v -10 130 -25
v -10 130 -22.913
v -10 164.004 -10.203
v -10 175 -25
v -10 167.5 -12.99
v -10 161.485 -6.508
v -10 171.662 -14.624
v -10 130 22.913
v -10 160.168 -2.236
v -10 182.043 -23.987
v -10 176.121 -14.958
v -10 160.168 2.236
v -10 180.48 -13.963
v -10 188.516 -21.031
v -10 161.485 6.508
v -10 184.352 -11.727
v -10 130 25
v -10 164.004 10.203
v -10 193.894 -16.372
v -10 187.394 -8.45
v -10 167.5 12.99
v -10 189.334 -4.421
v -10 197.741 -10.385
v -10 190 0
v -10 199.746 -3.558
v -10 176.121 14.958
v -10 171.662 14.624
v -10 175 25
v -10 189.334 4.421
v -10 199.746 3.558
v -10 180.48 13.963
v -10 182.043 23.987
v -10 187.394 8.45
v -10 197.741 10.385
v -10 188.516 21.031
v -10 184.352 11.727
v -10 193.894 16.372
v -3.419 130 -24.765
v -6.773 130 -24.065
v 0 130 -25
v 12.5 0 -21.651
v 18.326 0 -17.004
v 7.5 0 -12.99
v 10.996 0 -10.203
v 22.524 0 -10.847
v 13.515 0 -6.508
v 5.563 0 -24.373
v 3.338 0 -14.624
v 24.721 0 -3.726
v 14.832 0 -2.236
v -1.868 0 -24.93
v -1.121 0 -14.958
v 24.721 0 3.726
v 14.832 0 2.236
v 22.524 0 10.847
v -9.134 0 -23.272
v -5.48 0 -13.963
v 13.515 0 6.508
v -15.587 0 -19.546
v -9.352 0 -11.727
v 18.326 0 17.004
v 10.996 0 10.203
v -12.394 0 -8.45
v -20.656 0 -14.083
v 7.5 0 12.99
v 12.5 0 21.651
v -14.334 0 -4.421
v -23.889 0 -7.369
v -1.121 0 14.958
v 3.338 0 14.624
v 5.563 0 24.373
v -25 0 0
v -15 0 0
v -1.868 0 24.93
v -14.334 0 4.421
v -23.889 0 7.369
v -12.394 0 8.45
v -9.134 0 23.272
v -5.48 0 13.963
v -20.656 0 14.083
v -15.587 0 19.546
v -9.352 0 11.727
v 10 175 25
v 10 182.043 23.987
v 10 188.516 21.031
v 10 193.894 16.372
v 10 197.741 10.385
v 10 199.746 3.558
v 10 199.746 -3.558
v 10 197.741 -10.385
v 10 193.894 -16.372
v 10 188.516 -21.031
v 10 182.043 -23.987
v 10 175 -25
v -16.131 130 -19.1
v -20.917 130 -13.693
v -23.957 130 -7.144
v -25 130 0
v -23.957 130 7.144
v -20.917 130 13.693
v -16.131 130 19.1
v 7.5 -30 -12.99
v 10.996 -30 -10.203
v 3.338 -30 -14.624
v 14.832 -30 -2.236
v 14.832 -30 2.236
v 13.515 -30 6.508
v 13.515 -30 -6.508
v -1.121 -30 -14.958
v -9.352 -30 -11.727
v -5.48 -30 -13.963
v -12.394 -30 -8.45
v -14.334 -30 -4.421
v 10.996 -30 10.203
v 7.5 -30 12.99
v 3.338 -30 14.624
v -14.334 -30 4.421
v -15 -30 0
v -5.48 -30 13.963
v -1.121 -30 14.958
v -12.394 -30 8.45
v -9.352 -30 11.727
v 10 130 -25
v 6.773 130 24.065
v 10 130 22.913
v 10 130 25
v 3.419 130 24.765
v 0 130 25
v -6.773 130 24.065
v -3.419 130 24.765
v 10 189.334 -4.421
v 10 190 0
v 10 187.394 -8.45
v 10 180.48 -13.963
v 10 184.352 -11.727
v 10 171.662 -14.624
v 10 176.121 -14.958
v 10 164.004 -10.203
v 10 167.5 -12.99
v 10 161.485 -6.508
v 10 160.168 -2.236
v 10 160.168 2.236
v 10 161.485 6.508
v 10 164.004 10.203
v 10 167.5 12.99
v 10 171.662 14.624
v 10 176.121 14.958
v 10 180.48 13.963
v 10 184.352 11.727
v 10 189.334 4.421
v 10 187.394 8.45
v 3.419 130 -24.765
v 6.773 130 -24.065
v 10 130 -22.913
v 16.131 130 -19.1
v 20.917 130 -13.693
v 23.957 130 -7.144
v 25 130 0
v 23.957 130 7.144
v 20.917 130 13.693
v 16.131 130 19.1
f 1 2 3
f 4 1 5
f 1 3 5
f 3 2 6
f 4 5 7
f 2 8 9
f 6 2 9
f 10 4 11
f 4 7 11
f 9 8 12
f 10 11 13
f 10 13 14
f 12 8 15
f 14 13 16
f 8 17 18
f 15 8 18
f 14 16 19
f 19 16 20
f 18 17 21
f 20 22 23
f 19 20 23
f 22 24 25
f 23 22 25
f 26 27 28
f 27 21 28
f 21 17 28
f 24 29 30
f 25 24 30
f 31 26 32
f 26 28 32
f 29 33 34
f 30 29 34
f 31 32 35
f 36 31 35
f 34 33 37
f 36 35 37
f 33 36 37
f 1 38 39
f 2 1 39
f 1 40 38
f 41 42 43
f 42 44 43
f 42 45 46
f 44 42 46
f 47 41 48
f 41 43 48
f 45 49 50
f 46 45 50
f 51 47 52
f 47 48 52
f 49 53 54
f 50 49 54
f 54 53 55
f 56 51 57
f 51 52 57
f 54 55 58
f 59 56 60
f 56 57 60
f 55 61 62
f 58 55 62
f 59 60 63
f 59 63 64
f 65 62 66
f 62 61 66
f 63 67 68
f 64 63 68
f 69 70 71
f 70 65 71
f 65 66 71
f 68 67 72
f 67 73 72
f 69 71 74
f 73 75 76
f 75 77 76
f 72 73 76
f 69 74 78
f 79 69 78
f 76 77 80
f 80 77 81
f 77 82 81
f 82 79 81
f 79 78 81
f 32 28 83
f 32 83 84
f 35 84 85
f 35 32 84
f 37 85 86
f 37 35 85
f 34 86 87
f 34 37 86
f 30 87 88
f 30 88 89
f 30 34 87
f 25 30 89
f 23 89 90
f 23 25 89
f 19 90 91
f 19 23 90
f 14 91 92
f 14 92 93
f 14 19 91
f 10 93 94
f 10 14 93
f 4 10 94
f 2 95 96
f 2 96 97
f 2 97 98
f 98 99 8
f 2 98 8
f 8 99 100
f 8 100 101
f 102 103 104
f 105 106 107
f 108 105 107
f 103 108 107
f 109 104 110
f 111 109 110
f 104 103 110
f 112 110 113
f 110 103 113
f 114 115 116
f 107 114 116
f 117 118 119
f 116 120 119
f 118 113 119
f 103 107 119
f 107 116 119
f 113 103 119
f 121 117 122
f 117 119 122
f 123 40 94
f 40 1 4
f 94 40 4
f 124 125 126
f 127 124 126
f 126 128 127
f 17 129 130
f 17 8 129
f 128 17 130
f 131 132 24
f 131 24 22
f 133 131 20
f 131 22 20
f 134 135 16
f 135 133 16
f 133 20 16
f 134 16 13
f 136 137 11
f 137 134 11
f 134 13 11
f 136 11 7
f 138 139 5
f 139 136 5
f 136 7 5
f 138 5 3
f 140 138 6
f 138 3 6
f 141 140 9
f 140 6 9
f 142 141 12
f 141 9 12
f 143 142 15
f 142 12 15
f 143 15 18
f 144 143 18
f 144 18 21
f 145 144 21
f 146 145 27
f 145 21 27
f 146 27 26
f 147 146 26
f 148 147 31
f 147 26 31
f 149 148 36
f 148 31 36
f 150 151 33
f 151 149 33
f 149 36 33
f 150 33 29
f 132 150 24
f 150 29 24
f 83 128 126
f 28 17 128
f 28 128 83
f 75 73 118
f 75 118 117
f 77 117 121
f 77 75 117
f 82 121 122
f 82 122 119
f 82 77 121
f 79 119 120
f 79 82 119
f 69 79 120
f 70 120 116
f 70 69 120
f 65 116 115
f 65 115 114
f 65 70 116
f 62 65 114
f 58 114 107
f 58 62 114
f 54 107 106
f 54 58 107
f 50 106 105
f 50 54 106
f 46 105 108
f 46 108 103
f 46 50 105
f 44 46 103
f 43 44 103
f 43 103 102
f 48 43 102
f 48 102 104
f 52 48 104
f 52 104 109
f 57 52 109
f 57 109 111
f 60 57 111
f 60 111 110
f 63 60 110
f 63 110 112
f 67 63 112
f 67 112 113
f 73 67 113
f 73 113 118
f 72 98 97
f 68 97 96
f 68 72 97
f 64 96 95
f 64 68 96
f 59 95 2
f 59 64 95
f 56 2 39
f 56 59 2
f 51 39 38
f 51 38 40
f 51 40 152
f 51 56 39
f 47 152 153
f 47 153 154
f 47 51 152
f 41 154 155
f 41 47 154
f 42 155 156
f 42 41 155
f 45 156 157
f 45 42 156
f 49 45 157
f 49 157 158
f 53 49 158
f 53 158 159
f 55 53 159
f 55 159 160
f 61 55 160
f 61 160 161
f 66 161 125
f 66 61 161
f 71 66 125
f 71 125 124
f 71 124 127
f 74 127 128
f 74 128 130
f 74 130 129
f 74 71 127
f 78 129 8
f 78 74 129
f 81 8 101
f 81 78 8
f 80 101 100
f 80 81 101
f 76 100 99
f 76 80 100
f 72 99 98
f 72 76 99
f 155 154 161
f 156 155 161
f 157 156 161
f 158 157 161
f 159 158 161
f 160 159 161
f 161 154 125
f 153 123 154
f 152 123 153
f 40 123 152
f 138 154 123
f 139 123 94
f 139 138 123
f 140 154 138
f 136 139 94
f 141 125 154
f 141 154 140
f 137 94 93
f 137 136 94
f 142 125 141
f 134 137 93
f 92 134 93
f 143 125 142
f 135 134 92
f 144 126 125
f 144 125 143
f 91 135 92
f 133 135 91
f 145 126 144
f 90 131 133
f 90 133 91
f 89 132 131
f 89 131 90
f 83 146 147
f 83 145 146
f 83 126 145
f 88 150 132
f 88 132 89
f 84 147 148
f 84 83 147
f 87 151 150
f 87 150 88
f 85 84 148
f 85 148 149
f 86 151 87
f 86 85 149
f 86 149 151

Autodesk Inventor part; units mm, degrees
ref_plane "YZ Plane" through (0, 0, 0) normal (1, 0, 0) x (0, 1, 0)
ref_plane "XZ Plane" through (0, 0, 0) normal (0, 1, 0) x (-1, 0, 0)
ref_plane "XY Plane" through (0, 0, 0) normal (0, 0, 1) x (1, 0, 0)
sketch "Sketch7" plane through (0, 0, 0) normal (0, 1, 0) x (-1, 0, 0)
  circle A0 centre (0, 0) radius 25
  circle A1 centre (0, 0) radius 15
  dimension "d19" = 50
  dimension "d20" = 30
extrude "Extrusion5" add sketch "Sketch7" against normal blind 30 contours A1
extrude "Extrusion6" add sketch "Sketch7" along normal blind 200 contours A0 | A1
sketch "Sketch8" plane through (0, 0, 0) normal (1, 0, 0) x (0, 1, 0)
  line L0 (200, -25) -> (200, 25) projected
  line L1 (0, -25) -> (0, 25) projected
  line L2 (0, 25) -> (200, 25) projected
  line L3 (0, -25) -> (200, -25) projected
  line L4 (200, -25) -> (200, 25) projected
  line L5 (200, -25) -> (130, -25)
  line L6 (130, -25) -> (130, 25)
  line L7 (130, 25) -> (200, 25)
  line L8 (200, 25) -> (200, -25)
  circle A0 centre (175, 0) radius 25
  circle A1 centre (175, 0) radius 15
  point P0 (0, 0)
  point P1 (0, 0)
  point P2 (175, -25)
  point P3 (175, 25)
  dimension "d25" = 70
  dimension "d26" = 50
  dimension "d27" = 30
extrude "Extrusion7" cut sketch "Sketch8" along normal mid plane 200 contours L3 A0 L0 | A0 L2 L0 | A0 | L3 L6 L2 A0 | A1
extrude "Extrusion8" add sketch "Sketch8" along normal mid plane 20 contours A0 | L3 L6 L2 A0
properties part number "Manipulator Link Type 2"
